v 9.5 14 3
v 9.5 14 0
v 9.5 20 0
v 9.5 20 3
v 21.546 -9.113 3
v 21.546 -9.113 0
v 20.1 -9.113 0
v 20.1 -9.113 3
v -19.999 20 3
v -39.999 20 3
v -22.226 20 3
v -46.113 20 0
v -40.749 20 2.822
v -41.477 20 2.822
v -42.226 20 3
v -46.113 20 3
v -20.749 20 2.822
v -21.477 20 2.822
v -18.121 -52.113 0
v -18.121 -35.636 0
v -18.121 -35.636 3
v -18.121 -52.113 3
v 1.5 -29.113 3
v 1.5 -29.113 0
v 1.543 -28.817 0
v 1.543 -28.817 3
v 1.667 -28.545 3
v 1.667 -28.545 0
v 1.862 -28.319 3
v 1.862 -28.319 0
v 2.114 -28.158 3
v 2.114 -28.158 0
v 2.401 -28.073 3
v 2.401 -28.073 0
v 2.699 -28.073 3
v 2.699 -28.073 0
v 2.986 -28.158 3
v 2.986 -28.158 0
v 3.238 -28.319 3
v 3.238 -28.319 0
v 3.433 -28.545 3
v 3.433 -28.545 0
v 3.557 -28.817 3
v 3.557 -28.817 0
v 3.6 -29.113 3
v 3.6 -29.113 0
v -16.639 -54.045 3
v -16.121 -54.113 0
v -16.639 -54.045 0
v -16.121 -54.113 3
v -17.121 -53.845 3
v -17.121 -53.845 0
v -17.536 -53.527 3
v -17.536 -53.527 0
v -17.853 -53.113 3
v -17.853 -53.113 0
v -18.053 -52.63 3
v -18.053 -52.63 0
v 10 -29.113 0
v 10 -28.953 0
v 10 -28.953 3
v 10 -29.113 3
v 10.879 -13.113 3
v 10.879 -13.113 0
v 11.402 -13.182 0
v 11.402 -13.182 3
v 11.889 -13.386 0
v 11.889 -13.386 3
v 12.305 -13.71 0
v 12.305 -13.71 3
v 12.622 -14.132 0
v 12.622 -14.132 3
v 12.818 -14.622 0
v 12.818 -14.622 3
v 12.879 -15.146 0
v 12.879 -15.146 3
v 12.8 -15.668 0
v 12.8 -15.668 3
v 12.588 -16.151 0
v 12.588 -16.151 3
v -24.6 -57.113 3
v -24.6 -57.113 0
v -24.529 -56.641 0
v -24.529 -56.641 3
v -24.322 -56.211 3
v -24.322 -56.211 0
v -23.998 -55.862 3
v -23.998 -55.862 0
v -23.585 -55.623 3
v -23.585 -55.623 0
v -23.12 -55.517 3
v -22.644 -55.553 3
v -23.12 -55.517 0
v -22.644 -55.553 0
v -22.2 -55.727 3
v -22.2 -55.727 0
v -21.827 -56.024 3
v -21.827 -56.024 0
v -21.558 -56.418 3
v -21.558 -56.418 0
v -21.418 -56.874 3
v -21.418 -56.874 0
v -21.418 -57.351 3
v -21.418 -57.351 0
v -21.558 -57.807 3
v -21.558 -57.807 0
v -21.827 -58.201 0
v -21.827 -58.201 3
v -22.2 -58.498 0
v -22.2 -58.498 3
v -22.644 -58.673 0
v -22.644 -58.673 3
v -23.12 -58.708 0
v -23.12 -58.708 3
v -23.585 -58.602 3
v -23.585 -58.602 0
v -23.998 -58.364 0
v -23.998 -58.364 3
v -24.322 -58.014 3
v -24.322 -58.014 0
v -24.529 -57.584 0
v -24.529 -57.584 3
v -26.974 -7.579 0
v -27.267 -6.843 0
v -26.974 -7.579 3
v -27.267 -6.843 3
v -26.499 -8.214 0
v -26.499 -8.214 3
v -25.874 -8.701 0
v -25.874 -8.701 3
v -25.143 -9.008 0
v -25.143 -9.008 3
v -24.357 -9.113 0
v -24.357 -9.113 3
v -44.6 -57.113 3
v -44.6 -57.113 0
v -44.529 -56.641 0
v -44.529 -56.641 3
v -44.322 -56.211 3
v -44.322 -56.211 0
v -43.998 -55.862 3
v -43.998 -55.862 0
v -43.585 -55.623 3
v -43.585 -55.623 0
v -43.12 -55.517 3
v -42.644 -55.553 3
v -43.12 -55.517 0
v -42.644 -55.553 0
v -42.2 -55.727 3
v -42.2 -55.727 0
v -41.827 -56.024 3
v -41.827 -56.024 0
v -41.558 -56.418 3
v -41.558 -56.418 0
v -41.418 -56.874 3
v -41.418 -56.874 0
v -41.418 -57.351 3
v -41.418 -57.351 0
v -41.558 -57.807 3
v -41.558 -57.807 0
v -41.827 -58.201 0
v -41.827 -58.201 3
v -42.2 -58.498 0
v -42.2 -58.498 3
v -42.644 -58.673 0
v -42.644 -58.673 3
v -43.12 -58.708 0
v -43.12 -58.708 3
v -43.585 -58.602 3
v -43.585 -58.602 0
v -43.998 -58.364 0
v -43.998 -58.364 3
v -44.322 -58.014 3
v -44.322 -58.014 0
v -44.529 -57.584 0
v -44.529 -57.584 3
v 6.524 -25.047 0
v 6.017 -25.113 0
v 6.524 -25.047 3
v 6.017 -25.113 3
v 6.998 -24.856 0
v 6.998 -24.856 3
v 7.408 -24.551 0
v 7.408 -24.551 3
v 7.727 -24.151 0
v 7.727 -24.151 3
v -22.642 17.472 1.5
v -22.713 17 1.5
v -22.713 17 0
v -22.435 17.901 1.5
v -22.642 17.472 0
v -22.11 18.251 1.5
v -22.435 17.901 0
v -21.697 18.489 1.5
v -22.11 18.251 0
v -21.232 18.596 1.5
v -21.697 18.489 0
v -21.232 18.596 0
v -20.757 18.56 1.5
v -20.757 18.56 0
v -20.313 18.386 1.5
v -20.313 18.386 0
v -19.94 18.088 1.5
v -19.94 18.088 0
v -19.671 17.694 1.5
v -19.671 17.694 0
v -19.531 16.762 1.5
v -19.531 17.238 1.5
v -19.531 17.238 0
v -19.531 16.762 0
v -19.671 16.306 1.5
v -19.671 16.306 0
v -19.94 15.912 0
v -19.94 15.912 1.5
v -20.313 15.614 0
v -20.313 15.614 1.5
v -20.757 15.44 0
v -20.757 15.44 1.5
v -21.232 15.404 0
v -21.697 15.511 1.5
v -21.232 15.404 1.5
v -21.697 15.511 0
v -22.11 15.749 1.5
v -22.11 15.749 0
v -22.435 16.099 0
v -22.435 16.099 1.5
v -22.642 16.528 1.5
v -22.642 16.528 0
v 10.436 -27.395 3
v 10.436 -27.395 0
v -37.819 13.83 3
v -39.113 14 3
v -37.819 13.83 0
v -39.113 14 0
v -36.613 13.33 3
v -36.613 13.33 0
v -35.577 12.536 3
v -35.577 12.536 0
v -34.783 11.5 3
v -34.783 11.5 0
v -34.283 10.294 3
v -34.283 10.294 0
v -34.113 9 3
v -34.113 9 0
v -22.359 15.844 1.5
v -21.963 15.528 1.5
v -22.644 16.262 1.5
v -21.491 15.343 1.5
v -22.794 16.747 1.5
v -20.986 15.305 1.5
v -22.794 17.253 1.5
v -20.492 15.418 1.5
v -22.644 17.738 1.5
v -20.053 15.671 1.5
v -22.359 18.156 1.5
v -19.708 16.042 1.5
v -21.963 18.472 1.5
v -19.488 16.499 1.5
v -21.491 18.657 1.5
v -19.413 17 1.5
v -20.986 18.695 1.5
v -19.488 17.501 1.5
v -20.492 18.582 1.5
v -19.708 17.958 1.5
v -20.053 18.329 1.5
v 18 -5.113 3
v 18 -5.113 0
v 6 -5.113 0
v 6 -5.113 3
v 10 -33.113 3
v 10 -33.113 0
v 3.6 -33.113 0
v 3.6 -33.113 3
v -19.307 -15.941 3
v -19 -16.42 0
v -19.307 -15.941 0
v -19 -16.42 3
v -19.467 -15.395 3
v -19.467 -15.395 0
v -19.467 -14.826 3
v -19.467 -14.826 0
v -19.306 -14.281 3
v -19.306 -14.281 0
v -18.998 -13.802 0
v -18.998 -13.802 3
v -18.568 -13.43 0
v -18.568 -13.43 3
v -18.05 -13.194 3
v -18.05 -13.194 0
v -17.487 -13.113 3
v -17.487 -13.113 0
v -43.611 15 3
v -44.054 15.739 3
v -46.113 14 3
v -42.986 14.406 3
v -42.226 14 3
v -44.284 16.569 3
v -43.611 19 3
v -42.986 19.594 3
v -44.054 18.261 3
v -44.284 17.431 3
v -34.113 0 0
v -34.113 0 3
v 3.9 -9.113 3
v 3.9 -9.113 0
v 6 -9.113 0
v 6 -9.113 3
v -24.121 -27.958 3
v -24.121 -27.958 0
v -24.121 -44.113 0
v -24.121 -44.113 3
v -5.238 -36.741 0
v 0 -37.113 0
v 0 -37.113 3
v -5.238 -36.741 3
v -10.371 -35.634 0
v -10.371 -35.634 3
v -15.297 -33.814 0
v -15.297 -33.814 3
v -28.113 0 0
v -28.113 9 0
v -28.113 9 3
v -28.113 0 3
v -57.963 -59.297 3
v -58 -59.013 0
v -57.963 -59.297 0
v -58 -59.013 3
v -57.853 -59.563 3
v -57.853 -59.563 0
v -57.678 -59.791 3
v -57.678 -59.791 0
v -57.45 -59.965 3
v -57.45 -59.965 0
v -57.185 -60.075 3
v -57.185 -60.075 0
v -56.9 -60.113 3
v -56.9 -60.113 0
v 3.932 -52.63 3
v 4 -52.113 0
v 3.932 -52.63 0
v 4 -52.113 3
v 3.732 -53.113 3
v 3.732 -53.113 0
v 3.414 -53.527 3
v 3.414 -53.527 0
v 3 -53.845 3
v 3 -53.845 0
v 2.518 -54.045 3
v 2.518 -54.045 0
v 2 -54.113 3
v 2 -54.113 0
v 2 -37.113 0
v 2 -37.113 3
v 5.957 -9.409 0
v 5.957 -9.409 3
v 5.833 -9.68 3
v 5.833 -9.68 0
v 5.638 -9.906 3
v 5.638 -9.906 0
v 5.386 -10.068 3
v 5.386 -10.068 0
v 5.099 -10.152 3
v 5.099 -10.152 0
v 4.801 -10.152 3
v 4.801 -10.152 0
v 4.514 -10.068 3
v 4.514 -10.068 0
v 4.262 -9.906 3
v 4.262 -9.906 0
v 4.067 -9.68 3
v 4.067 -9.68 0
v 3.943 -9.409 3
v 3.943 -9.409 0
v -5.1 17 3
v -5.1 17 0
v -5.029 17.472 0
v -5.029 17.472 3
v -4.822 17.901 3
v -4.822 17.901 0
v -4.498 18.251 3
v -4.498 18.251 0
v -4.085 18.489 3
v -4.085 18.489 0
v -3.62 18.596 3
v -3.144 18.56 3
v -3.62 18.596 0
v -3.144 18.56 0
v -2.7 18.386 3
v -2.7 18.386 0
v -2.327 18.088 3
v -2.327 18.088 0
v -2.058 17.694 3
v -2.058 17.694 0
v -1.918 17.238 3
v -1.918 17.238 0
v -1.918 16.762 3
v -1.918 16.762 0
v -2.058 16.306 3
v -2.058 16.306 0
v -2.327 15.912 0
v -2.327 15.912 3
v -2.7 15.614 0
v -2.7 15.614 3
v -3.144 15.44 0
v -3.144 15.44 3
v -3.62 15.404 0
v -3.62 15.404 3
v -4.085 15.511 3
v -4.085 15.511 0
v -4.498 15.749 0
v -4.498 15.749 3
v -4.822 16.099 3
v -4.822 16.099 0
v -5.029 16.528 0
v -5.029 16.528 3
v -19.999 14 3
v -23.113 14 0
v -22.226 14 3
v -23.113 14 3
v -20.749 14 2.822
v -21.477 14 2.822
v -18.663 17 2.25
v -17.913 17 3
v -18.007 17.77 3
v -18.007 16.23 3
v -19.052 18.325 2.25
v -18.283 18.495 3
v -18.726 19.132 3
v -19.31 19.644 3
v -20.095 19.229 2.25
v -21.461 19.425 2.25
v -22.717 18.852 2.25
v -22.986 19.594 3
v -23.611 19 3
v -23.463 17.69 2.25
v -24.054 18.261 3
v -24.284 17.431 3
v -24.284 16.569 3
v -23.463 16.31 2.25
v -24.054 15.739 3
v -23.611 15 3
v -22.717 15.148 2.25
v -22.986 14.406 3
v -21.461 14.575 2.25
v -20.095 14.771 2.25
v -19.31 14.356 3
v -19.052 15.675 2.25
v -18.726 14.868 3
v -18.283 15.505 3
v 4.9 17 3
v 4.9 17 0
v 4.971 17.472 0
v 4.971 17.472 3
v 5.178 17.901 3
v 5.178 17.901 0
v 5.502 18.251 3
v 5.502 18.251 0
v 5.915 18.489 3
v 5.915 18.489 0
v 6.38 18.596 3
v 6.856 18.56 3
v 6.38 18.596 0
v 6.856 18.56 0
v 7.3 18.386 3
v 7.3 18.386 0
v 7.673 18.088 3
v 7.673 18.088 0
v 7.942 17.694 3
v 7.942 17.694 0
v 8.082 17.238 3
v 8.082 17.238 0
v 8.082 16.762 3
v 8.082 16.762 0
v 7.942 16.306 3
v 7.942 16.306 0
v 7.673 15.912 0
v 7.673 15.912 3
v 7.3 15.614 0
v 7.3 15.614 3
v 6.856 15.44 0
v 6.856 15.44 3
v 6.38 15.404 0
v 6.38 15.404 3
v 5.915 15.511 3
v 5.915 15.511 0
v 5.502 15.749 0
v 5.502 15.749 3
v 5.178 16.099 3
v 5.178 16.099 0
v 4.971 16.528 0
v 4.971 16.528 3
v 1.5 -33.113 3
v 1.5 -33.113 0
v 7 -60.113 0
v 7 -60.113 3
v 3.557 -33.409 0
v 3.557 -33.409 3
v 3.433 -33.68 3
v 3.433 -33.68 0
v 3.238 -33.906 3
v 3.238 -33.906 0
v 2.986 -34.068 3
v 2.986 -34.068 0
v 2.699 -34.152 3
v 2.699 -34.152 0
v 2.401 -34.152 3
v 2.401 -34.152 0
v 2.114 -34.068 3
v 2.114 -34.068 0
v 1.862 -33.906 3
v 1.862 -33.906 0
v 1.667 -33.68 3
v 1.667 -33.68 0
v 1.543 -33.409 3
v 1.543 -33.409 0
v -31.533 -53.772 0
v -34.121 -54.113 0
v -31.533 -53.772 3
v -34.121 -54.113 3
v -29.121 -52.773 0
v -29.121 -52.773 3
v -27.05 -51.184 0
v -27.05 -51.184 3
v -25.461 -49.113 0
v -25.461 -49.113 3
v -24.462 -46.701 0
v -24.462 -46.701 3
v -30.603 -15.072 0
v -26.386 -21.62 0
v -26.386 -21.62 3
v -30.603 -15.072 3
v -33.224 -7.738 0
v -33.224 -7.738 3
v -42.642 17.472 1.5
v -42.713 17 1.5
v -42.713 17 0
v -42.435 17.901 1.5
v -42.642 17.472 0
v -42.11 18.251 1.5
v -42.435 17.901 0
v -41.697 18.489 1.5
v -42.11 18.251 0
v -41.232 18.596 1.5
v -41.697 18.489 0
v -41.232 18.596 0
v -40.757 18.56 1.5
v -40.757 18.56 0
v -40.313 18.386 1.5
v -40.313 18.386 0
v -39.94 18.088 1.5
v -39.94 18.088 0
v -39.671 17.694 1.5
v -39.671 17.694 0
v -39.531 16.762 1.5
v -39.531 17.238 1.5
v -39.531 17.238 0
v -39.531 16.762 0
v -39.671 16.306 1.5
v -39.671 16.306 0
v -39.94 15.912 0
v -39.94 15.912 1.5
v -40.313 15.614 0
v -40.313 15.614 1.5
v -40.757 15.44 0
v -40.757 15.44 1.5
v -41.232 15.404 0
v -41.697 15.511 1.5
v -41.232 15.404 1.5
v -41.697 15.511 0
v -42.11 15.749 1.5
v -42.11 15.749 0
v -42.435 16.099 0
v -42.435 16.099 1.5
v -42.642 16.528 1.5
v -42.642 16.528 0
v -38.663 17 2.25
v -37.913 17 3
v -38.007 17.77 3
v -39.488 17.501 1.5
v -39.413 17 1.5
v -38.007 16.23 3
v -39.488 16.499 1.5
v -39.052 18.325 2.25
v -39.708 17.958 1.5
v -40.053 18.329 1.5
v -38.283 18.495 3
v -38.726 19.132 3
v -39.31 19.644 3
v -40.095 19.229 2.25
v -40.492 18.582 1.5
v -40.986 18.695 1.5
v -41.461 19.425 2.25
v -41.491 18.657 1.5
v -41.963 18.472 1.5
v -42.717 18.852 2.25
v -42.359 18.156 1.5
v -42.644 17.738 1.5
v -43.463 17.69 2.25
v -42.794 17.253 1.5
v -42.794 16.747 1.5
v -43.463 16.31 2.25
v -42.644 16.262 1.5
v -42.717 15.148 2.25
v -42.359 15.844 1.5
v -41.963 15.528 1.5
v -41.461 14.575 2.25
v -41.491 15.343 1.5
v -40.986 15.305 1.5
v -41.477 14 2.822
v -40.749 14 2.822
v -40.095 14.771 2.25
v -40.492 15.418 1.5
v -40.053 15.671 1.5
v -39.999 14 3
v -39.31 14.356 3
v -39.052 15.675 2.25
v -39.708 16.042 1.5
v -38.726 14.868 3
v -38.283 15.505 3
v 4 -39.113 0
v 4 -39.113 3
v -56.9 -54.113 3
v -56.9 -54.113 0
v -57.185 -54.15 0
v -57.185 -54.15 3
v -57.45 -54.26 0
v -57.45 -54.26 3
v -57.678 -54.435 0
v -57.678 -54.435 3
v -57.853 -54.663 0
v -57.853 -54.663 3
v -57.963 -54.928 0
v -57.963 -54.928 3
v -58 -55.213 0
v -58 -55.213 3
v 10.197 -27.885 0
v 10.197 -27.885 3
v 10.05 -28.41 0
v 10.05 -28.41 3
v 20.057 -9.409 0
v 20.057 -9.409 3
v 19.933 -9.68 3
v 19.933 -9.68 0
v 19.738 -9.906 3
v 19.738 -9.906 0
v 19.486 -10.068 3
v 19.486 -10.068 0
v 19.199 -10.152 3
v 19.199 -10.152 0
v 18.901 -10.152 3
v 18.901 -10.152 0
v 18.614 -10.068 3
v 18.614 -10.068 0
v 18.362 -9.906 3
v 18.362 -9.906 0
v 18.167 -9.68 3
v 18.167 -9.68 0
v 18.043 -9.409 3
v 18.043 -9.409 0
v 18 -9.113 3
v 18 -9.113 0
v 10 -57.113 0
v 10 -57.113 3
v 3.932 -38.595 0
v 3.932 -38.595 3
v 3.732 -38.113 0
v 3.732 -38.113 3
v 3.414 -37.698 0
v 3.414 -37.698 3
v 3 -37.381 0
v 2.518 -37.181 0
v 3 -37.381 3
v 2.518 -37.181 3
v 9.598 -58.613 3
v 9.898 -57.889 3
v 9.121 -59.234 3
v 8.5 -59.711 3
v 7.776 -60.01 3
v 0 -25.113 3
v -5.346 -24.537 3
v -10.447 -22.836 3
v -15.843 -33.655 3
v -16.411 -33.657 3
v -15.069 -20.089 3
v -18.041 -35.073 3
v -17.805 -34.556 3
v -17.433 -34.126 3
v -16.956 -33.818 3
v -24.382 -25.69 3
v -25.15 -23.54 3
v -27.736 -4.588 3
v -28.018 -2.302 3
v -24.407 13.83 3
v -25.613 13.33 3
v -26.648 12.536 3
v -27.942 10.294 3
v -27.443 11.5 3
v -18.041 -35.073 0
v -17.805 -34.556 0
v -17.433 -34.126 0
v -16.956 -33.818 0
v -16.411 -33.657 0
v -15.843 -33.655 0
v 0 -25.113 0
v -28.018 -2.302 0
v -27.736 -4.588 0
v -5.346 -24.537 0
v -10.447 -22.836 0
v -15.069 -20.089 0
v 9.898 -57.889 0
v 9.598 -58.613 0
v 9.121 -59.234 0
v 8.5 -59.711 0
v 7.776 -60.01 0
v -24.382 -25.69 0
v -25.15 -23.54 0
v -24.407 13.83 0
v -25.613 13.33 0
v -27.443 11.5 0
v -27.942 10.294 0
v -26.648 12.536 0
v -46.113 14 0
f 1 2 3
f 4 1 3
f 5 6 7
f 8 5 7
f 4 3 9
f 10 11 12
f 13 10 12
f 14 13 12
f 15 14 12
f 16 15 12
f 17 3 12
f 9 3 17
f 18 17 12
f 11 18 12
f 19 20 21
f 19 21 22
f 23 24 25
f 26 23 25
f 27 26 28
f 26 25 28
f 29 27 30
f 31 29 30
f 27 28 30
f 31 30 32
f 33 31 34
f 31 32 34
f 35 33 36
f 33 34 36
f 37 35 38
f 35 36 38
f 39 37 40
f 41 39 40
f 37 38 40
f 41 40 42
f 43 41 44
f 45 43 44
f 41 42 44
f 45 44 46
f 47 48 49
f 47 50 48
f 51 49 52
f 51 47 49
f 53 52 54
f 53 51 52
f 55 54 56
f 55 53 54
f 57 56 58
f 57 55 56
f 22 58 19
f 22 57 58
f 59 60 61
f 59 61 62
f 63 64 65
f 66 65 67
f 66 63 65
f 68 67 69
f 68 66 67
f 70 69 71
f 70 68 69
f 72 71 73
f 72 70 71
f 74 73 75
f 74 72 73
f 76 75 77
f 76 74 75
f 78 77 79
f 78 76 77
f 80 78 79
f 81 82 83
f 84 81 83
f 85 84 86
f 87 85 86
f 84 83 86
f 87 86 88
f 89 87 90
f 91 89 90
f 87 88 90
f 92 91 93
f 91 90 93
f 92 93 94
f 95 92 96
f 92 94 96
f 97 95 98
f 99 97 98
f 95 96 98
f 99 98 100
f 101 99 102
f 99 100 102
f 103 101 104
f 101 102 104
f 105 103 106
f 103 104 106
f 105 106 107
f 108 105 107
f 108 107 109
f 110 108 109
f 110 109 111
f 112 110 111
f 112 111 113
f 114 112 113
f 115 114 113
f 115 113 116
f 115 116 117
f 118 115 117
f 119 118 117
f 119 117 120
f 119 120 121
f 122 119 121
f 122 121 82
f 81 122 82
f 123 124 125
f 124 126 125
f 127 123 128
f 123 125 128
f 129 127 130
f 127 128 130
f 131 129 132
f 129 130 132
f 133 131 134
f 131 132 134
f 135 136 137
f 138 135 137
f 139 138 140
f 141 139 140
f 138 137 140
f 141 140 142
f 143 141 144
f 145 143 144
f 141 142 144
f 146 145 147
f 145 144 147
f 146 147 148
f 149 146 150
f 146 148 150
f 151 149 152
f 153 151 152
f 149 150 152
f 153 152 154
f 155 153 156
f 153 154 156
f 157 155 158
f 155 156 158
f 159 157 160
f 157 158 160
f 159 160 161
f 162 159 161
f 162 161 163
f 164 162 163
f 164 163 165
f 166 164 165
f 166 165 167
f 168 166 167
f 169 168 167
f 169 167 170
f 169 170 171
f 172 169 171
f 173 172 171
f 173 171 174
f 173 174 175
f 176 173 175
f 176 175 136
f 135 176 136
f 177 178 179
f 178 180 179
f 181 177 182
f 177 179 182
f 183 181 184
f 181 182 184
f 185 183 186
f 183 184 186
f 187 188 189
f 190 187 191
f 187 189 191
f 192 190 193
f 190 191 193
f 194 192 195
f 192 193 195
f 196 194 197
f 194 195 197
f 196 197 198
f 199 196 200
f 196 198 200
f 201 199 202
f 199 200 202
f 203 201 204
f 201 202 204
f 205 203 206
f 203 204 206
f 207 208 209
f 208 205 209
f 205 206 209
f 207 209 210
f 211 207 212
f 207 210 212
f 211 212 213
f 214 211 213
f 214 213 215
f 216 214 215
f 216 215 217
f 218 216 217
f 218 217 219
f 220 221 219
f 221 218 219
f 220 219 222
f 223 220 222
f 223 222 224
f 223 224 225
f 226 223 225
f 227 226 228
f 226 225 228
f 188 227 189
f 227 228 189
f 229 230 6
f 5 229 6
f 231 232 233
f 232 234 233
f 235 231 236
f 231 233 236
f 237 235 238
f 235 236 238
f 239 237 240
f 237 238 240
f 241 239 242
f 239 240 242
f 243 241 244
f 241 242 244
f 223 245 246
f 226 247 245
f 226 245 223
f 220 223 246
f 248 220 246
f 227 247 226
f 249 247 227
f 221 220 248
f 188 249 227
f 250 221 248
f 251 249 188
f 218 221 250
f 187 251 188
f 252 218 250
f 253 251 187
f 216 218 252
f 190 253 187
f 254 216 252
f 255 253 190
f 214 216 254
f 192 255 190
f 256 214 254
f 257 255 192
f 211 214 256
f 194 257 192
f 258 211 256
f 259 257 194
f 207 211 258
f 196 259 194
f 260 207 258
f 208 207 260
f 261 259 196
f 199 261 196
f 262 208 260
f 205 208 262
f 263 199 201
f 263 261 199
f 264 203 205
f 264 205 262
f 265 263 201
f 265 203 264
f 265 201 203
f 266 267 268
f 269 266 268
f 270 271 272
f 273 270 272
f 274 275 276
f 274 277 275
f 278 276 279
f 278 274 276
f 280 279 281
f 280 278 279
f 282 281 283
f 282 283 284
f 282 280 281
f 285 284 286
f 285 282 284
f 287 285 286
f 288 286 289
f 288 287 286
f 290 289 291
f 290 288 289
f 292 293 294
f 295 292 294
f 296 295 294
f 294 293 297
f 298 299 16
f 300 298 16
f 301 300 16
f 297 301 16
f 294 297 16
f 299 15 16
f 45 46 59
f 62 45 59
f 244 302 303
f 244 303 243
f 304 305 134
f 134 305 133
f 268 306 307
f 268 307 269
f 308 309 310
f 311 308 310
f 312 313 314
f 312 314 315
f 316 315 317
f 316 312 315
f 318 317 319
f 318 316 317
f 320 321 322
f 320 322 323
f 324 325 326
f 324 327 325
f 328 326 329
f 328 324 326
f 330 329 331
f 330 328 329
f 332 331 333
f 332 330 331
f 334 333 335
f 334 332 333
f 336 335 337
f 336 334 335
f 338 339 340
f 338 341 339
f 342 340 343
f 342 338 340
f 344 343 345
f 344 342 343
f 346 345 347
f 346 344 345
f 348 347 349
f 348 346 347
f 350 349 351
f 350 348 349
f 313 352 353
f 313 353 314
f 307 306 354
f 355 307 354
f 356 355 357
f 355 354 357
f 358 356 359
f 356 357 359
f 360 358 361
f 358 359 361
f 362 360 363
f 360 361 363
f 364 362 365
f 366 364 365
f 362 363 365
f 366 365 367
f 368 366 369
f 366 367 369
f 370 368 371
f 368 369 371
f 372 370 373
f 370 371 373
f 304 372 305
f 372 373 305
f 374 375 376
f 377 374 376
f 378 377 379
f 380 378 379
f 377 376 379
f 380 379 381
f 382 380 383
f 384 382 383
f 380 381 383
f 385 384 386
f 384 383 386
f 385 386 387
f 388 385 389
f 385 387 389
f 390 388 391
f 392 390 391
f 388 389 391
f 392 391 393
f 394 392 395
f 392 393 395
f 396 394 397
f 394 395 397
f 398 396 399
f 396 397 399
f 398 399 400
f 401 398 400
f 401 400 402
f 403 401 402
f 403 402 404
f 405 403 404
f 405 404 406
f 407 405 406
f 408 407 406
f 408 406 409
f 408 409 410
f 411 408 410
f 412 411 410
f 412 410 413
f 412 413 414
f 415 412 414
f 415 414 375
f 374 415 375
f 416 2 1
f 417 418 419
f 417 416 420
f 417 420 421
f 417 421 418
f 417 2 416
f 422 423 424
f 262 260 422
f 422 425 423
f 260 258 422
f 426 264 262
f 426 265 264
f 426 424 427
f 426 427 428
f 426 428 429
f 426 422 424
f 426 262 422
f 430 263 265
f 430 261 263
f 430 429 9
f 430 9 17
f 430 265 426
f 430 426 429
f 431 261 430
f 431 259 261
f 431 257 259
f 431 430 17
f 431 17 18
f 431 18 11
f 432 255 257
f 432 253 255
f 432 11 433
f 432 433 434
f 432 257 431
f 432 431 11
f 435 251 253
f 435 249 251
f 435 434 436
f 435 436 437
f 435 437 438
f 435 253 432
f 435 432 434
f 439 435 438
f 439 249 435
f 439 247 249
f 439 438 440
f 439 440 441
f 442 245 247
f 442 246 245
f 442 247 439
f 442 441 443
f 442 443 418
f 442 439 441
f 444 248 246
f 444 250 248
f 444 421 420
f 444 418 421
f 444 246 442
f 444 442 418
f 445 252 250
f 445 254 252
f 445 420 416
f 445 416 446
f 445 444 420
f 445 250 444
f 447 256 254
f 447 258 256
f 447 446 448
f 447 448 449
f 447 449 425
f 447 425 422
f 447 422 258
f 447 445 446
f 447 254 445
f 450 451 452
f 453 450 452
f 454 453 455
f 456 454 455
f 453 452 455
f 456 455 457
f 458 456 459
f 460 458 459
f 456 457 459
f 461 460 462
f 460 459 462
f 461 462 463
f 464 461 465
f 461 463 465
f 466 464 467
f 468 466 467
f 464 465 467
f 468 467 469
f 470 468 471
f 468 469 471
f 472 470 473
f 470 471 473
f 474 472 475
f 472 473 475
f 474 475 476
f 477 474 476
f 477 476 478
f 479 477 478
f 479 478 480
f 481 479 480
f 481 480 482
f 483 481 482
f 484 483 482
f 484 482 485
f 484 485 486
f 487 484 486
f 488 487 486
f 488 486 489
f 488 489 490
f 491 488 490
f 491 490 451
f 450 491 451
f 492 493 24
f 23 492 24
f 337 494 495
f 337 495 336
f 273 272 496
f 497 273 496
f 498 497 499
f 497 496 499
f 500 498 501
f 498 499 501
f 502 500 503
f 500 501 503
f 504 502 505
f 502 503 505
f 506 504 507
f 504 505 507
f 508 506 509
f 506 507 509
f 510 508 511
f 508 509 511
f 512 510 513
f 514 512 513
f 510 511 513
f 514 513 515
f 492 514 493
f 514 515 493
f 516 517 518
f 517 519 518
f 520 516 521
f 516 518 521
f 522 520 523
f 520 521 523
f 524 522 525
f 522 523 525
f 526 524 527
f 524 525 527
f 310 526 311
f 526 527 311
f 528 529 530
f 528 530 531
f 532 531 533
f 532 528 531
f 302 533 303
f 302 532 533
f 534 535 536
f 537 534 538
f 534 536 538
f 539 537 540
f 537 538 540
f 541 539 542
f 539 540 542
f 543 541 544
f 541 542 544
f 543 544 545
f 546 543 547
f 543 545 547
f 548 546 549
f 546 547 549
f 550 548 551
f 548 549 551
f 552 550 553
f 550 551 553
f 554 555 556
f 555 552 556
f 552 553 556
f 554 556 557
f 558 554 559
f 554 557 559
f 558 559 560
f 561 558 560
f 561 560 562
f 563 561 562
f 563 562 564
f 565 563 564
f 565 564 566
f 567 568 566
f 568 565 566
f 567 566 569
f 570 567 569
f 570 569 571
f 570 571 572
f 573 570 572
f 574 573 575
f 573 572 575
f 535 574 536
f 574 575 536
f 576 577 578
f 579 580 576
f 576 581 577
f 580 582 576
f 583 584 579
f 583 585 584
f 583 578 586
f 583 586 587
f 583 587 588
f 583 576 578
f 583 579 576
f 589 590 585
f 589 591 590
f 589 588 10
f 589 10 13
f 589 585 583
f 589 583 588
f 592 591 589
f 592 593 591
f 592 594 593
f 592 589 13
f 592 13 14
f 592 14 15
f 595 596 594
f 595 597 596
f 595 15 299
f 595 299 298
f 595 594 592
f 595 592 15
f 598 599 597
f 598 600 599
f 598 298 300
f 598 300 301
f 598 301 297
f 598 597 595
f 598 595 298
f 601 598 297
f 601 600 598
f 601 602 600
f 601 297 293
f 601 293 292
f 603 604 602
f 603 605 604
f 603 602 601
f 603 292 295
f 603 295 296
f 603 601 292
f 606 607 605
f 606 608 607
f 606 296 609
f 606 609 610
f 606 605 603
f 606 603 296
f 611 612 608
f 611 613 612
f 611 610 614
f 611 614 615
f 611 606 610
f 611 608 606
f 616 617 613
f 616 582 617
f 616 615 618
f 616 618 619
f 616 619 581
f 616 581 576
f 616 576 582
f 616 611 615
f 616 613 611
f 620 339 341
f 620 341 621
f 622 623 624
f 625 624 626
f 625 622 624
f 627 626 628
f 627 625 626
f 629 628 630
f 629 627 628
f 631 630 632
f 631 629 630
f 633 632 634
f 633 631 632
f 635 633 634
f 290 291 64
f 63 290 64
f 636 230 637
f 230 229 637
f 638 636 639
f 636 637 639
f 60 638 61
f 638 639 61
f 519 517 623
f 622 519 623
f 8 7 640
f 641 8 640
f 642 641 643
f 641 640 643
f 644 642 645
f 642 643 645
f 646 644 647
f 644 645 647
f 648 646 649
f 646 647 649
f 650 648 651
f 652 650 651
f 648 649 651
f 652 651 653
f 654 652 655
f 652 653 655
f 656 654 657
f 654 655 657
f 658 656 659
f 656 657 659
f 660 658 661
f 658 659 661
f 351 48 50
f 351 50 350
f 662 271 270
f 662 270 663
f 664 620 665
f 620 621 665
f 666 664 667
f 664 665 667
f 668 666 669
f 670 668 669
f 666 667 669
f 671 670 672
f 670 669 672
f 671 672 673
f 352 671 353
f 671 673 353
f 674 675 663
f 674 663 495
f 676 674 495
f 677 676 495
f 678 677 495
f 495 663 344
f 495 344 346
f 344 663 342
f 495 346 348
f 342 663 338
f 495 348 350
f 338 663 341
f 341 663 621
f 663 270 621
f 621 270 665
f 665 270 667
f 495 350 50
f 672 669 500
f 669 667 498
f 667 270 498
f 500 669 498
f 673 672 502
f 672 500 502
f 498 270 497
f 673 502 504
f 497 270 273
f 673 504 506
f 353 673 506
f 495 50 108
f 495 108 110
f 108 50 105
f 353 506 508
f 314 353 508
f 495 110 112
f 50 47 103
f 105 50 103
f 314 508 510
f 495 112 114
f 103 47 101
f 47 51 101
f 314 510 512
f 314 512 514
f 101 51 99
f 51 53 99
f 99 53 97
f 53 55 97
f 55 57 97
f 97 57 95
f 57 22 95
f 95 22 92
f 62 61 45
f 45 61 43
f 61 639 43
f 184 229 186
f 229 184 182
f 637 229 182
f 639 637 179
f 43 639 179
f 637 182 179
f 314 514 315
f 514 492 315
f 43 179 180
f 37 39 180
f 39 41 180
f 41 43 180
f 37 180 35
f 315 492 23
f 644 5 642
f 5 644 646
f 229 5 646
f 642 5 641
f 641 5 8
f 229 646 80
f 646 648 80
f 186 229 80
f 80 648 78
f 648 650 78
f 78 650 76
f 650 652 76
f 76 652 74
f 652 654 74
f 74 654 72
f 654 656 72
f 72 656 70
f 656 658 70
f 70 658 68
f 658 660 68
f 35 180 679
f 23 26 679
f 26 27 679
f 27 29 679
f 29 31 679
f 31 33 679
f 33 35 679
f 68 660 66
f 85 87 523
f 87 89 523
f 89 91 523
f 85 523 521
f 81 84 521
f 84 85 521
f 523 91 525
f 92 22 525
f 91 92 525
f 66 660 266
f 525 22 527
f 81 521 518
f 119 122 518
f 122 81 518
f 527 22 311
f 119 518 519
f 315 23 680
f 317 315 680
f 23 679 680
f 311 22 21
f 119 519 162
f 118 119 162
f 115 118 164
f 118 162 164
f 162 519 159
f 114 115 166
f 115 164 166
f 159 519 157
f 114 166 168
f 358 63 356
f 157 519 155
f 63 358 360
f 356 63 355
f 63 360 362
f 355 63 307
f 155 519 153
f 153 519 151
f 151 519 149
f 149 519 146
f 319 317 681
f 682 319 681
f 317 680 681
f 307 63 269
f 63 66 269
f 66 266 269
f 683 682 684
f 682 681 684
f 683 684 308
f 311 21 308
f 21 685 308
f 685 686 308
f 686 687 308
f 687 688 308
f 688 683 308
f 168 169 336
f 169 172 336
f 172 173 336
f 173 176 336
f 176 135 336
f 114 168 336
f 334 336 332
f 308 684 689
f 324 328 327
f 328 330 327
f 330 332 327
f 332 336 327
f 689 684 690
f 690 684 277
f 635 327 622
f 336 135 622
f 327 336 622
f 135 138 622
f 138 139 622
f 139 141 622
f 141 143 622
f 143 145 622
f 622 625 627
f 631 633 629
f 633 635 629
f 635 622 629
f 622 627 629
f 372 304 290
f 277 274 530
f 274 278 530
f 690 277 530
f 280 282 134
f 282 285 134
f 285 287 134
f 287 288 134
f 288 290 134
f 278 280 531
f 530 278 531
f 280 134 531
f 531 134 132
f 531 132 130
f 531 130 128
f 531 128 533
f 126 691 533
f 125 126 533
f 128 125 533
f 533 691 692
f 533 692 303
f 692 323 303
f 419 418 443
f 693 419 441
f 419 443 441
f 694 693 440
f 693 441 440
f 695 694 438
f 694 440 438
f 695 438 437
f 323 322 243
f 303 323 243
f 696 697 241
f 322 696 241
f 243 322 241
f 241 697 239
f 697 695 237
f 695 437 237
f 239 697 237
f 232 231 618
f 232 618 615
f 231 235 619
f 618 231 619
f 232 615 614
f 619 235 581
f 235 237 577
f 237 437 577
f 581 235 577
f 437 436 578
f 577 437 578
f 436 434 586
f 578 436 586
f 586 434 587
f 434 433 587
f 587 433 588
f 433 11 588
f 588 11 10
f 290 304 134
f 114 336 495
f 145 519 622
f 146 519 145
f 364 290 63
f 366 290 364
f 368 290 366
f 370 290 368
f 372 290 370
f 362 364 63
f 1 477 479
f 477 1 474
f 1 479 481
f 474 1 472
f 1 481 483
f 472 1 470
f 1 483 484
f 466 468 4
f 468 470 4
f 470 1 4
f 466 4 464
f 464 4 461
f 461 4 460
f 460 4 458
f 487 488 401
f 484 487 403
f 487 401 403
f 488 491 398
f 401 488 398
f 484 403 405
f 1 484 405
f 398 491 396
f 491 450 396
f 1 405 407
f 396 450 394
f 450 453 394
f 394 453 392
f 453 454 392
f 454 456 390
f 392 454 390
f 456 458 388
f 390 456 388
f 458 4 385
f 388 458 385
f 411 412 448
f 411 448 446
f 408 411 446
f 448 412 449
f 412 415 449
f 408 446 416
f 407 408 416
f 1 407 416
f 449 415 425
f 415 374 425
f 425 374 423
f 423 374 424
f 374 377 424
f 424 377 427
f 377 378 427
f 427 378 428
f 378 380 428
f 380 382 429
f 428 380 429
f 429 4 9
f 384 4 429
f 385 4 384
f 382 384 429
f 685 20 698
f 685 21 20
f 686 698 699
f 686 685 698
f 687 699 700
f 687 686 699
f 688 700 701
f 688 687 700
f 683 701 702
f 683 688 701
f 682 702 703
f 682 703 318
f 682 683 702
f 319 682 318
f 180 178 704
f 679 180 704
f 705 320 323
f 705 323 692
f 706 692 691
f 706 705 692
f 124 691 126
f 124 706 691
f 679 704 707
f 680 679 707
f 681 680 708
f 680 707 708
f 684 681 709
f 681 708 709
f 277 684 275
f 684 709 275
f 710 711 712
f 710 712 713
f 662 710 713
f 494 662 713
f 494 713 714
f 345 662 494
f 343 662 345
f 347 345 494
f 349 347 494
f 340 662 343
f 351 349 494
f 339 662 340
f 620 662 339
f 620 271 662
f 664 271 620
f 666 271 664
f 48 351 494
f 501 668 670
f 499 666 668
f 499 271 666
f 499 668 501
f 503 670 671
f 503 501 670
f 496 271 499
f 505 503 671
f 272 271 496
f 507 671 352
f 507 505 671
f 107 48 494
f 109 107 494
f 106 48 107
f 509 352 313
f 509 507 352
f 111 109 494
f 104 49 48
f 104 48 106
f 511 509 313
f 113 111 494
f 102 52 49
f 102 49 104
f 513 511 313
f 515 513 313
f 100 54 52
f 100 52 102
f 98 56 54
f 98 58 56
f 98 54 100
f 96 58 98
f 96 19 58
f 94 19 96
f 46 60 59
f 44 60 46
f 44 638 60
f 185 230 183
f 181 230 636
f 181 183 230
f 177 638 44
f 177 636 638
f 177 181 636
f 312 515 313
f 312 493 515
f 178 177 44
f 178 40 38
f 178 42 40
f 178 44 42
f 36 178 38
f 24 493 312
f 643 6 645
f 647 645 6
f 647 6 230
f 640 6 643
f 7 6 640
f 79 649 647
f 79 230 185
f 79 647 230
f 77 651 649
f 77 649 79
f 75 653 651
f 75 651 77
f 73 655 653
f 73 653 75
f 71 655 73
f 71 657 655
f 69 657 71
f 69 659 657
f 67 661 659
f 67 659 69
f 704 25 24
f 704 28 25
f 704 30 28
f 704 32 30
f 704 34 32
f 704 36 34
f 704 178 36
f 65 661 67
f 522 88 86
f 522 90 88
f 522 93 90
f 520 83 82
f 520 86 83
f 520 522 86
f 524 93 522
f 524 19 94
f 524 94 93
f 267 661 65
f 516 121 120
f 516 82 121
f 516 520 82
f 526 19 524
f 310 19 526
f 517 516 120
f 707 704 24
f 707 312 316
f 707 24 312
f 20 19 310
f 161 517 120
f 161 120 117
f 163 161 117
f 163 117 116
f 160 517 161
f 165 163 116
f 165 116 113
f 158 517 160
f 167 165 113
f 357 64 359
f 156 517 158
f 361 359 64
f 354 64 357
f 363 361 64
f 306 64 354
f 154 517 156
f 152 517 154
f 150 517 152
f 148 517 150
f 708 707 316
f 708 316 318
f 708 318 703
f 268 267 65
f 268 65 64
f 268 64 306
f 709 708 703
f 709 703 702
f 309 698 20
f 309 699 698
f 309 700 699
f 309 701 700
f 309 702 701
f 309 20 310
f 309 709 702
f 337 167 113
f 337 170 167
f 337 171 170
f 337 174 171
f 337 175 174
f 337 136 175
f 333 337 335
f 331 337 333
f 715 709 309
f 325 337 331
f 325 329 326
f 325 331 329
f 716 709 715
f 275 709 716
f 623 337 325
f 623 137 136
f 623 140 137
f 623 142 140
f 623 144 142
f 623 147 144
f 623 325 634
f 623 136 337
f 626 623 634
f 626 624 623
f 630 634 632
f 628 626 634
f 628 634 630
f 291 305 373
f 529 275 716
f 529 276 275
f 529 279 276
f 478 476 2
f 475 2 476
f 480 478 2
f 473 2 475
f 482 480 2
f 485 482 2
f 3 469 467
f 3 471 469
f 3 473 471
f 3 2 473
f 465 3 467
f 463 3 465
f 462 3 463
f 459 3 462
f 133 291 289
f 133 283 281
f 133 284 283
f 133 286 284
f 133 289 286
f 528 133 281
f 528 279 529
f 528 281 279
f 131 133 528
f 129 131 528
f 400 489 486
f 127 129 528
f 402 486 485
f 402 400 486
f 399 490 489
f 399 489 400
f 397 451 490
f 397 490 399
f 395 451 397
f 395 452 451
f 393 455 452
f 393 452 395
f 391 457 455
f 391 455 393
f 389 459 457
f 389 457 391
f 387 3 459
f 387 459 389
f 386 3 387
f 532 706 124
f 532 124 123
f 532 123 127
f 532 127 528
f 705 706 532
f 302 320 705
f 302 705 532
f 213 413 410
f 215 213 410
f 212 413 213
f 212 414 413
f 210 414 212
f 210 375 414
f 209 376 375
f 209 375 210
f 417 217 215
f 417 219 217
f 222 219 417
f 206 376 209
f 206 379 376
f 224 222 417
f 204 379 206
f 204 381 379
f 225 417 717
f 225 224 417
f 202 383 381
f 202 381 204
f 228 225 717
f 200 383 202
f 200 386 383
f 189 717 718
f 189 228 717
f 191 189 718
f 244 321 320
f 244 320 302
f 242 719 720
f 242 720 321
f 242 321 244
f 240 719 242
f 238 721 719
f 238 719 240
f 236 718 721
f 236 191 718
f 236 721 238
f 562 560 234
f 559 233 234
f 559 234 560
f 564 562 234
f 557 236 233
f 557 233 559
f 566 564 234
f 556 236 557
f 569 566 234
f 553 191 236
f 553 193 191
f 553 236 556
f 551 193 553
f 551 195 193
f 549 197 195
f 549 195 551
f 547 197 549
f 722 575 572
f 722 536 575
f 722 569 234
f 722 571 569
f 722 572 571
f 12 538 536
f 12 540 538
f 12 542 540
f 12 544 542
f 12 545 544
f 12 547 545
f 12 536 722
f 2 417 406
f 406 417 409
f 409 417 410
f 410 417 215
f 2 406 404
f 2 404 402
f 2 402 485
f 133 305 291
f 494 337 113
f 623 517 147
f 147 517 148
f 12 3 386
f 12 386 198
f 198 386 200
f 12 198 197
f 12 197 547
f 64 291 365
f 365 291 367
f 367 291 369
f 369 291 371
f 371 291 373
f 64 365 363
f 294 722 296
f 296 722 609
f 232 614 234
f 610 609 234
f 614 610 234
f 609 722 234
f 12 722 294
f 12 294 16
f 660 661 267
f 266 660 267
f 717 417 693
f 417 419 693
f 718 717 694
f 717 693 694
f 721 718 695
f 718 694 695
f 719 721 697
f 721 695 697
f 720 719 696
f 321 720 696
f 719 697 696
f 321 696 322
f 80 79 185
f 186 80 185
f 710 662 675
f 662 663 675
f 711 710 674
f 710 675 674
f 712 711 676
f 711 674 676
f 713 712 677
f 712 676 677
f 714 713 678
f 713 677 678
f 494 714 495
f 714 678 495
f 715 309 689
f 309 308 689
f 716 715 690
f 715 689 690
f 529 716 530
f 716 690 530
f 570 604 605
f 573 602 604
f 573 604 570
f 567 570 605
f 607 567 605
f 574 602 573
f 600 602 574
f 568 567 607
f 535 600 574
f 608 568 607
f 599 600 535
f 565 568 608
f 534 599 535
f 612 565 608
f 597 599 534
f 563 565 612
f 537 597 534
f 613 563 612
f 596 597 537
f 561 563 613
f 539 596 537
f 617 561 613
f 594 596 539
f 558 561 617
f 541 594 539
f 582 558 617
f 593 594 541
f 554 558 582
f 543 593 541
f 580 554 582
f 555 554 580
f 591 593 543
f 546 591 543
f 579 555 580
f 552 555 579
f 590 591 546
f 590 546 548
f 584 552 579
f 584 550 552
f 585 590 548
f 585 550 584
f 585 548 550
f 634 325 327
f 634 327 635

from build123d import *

# Parameters (mm, degrees)
EXTRUDE_1_DEPTH       = 3
EXTRUDE_START         = -3
SKETCH_2_W            = 40
SKETCH_2_H            = 6
EXTRUDE_2_DEPTH       = 3
EXTRUDE_3_DEPTH       = 3
EXTRUDE_4_DEPTH       = 3
CUT_EXTRUDE_1_DEPTH   = 10
SKETCH_7_W            = 12
SKETCH_7_H            = 4
EXTRUDE_5_DEPTH       = 3
SKETCH_8_R            = 1.05
CUT_EXTRUDE_2_DEPTH   = 10
SKETCH_9_W            = 26
SKETCH_9_H            = 6
EXTRUDE_6_DEPTH       = 3
SKETCH_10_R           = 1.6
CUT_EXTRUDE_3_DEPTH   = 10
SKETCH_14_W           = 18
SKETCH_14_H           = 6
EXTRUDE_7_DEPTH       = 3
SKETCH_15_R           = 1.6
CUT_EXTRUDE_4_DEPTH   = 10
FILLET_2_R            = 3
FILLET_3_R            = 3
FILLET_4_R            = 3
FILLET_5_R            = 10
FILLET_6_R            = 1.1
CUT_EXTRUDE_7_DEPTH   = 10
FILLET_8_R            = 2
SKETCH_17_W           = 5.387301628
SKETCH_17_H           = 6
CUT_EXTRUDE_8_DEPTH   = 10
SKETCH_18_W           = 31
SKETCH_18_H           = 6
EXTRUDE_8_DEPTH       = 3
SKETCH_19_R           = 1.6
CUT_EXTRUDE_9_DEPTH   = 10
OTHER_1_OUTLINE_R     = 1.7
OTHER_1_OUTLINE_R_2   = 1.6
OTHER_1_DEPTH         = 1.5
OTHER_1_DRAFT         = -45
OTHER_1_2_OUTLINE_R   = 1.7
OTHER_1_2_OUTLINE_R_2 = 1.6
OTHER_1_2_DEPTH       = 1.5
OTHER_1_2_DRAFT       = -45
SKETCH_23_W           = 5
SKETCH_23_H           = 6
CUT_EXTRUDE_10_DEPTH  = 10
FILLET_9_R            = 5


# Read off the part's stored shape, not the designer's step: 高级异型孔1
with BuildPart() as part:
    # 草图1 → 凸台-拉伸1 (new body)
    with BuildSketch(Plane.XY):
        with BuildLine():
            Line((0, -28.112698372), (10, -28.112698372))
            Line((10, -28.112698372), (10, -34.112698372))
            Line((10, -34.112698372), (0, -34.112698372))
            ThreePointArc((0, -34.112698372), (-24.121320344, -24.121320344), (-34.112698372, 0))
            Line((-34.112698372, 0), (-34.112698372, 20))
            Line((-34.112698372, 20), (-28.112698372, 20))
            Line((-28.112698372, 20), (-28.112698372, 0))
            ThreePointArc((-28.112698372, 0), (-19.878679656, -19.878679656), (0, -28.112698372))
        make_face()
    extrude(amount=EXTRUDE_1_DEPTH)

    # 草图2 → 凸台-拉伸2 (add)
    with BuildSketch(Plane.XY.offset(3).offset(EXTRUDE_START)):
        with BuildLine():
            Line((-24.121320344, -24.121320344), (-24.121320344, -54.112698372))
            Line((-24.121320344, -54.112698372), (-40, -54.112698372))
            Line((-40, -54.112698372), (-40, -60.112698372))
            Line((-40, -60.112698372), (10, -60.112698372))
            Line((10, -60.112698372), (10, -54.112698372))
            Line((10, -54.112698372), (-18.121320344, -54.112698372))
            Line((-18.121320344, -54.112698372), (-18.121320344, -28.901452199))
            ThreePointArc((-18.121320344, -28.901452199), (-21.256118841, -26.680584739), (-24.121320344, -24.121320344))
        make_face()
        with Locations((-31.112698372, 17)):
            Rectangle(SKETCH_2_W, SKETCH_2_H)
    extrude(amount=EXTRUDE_2_DEPTH)

    # 草图4 → 凸台-拉伸3 (add)
    with BuildSketch(Plane(origin=(0, 0, 0), x_dir=(-1, 0, 0), z_dir=(0, 0, -1))):
        with BuildLine():
            Line((-10, -28.112698372), (-21.546473969, -9.112698372))
            Line((-21.546473969, -9.112698372), (26.59478404, -9.112698372))
            ThreePointArc((26.59478404, -9.112698372), (16.342295877, -22.874727872), (0, -28.112698372))
            Line((0, -28.112698372), (-10, -28.112698372))
        make_face()
    extrude(amount=-EXTRUDE_3_DEPTH)

    # 草图6 → 凸台-拉伸4 (add)
    with BuildSketch(Plane.XY.offset(3).offset(EXTRUDE_START)):
        with BuildLine():
            Line((10, -34.112698372), (10, -54.112698372))
            Line((10, -54.112698372), (-18.121320344, -54.112698372))
            Line((-18.121320344, -54.112698372), (-18.121320344, -28.901452199))
            ThreePointArc((-18.121320344, -28.901452199), (-9.427875393, -32.784010673), (0, -34.112698372))
            Line((0, -34.112698372), (10, -34.112698372))
        make_face()
    extrude(amount=EXTRUDE_4_DEPTH)

    # 草图3 → 切除-拉伸1 (cut)
    with BuildSketch(Plane(origin=(0, 0, 0), x_dir=(-1, 0, 0), z_dir=(0, 0, -1))):
        with BuildLine():
            Line((-3.6, -29.112698372), (-10, -29.112698372))
            Line((-10, -29.112698372), (-10, -33.112698372))
            Line((-10, -33.112698372), (-3.6, -33.112698372))
            ThreePointArc((-3.6, -33.112698372), (-2.55, -34.162698372), (-1.5, -33.112698372))
            Line((-1.5, -33.112698372), (-1.5, -29.112698372))
            ThreePointArc((-1.5, -29.112698372), (-2.55, -28.062698372), (-3.6, -29.112698372))
        make_face()
    extrude(amount=-CUT_EXTRUDE_1_DEPTH, mode=Mode.SUBTRACT)

    # 草图7 → 凸台-拉伸5 (add)
    with BuildSketch(Plane(origin=(0, 0, 0), x_dir=(-1, 0, 0), z_dir=(0, 0, -1))):
        with Locations((-12, -7.112698372)):
            Rectangle(SKETCH_7_W, SKETCH_7_H)
    extrude(amount=-EXTRUDE_5_DEPTH)

    # 草图8 → 切除-拉伸2 (cut)
    with BuildSketch(Plane(origin=(0, 0, 0), x_dir=(-1, 0, 0), z_dir=(0, 0, -1))):
        with Locations((-4.95, -9.112698372)):
            Circle(SKETCH_8_R)
        with Locations((-19.05, -9.112698372)):
            Circle(SKETCH_8_R)
    extrude(amount=-CUT_EXTRUDE_2_DEPTH, mode=Mode.SUBTRACT)

    # 草图9 → 凸台-拉伸6 (add)
    with BuildSketch(Plane(origin=(0, 0, 0), x_dir=(-1, 0, 0), z_dir=(0, 0, -1))):
        with Locations((-1.887301628, 17)):
            Rectangle(SKETCH_9_W, SKETCH_9_H)
    extrude(amount=-EXTRUDE_6_DEPTH)

    # 草图10 → 切除-拉伸3 (cut)
    with BuildSketch(Plane(origin=(0, 0, 0), x_dir=(-1, 0, 0), z_dir=(0, 0, -1))):
        with Locations((41.112698372, 17)):
            Circle(SKETCH_10_R)
        with Locations((21.112698372, 17)):
            Circle(SKETCH_10_R)
        with Locations((3.5, 17)):
            Circle(SKETCH_10_R)
        with Locations((-6.5, 17)):
            Circle(SKETCH_10_R)
    extrude(amount=-CUT_EXTRUDE_3_DEPTH, mode=Mode.SUBTRACT)

    # 草图14 → 凸台-拉伸7 (add)
    with BuildSketch(Plane(origin=(0, 0, 0), x_dir=(-1, 0, 0), z_dir=(0, 0, -1))):
        with Locations((49, -57.112698372)):
            Rectangle(SKETCH_14_W, SKETCH_14_H)
    extrude(amount=-EXTRUDE_7_DEPTH)

    # 草图15 → 切除-拉伸4 (cut)
    with BuildSketch(Plane(origin=(0, 0, 0), x_dir=(-1, 0, 0), z_dir=(0, 0, -1))):
        with Locations((43, -57.112698372)):
            Circle(SKETCH_15_R)
        with Locations((23, -57.112698372)):
            Circle(SKETCH_15_R)
    extrude(amount=-CUT_EXTRUDE_4_DEPTH, mode=Mode.SUBTRACT)

    # 圆角2
    fillet_2_edges = [part.edges().sort_by_distance(p)[0] for p in [
        (-26.59478404, -9.112698372, 1.5),
    ]]
    fillet(fillet_2_edges, radius=FILLET_2_R)

    # 圆角3
    fillet_3_edges = [part.edges().sort_by_distance(p)[0] for p in [
        (10, -28.112698372, 1.5),
    ]]
    fillet(fillet_3_edges, radius=FILLET_3_R)

    # 圆角4
    fillet_4_edges = [part.edges().sort_by_distance(p)[0] for p in [
        (10, -60.112698372, 1.5),
    ]]
    fillet(fillet_4_edges, radius=FILLET_4_R)

    # 圆角5
    fillet_5_edges = [part.edges().sort_by_distance(p)[0] for p in [
        (-24.121320344, -24.121320344, 1.5),
        (-24.121320344, -54.112698372, 1.5),
    ]]
    fillet(fillet_5_edges, radius=FILLET_5_R)

    # 圆角6
    fillet_6_edges = [part.edges().sort_by_distance(p)[0] for p in [
        (-58, -60.112698372, 1.5),
        (-58, -54.112698372, 1.5),
    ]]
    fillet(fillet_6_edges, radius=FILLET_6_R)

    # 草图16 → 切除-拉伸7 (cut)
    with BuildSketch(Plane(origin=(0, 0, 0), x_dir=(-1, 0, 0), z_dir=(0, 0, -1))):
        with BuildLine():
            Line((-4, -37.112698372), (0, -37.112698372))
            ThreePointArc((0, -37.112698372), (9.363584206, -35.912054679), (18.121320344, -32.387808346))
            Line((18.121320344, -32.387808346), (18.121320344, -54.112698372))
            Line((18.121320344, -54.112698372), (-4, -54.112698372))
            Line((-4, -54.112698372), (-4, -37.112698372))
        make_face()
        with BuildLine():
            Line((-7.142425951, -25.112698372), (0, -25.112698372))
            ThreePointArc((0, -25.112698372), (12.275023024, -21.908250256), (21.417393888, -13.112698372))
            Line((21.417393888, -13.112698372), (-14.434935826, -13.112698372))
            Line((-14.434935826, -13.112698372), (-7.142425951, -25.112698372))
        make_face()
    extrude(amount=-CUT_EXTRUDE_7_DEPTH, mode=Mode.SUBTRACT)

    # 圆角8
    fillet_8_edges = [part.edges().sort_by_distance(p)[0] for p in [
        (4, -54.112698372, 1.5),
        (4, -37.112698372, 1.5),
        (-18.121320344, -32.387808346, 1.5),
        (-18.121320344, -54.112698372, 1.5),
        (-21.417393888, -13.112698372, 1.5),
        (7.142425951, -25.112698372, 1.5),
        (14.434935826, -13.112698372, 1.5),
    ]]
    fillet(fillet_8_edges, radius=FILLET_8_R)

    # 草图17 → 切除-拉伸8 (cut)
    with BuildSketch(Plane(origin=(0, 0, 0), x_dir=(-1, 0, 0), z_dir=(0, 0, -1))):
        with Locations((-12.193650814, 17)):
            Rectangle(SKETCH_17_W, SKETCH_17_H)
    extrude(amount=-CUT_EXTRUDE_8_DEPTH, mode=Mode.SUBTRACT)

    # 草图18 → 凸台-拉伸8 (add)
    with BuildSketch(Plane(origin=(0, 0, 0), x_dir=(-1, 0, 0), z_dir=(0, 0, -1))):
        with Locations((31.612698372, 17)):
            Rectangle(SKETCH_18_W, SKETCH_18_H)
    extrude(amount=-EXTRUDE_8_DEPTH)

    # 草图19 → 切除-拉伸9 (cut)
    with BuildSketch(Plane(origin=(0, 0, 0), x_dir=(-1, 0, 0), z_dir=(0, 0, -1))):
        with Locations((21.112698372, 17)):
            Circle(SKETCH_19_R)
        with Locations((41.112698372, 17)):
            Circle(SKETCH_19_R)
    extrude(amount=-CUT_EXTRUDE_9_DEPTH, mode=Mode.SUBTRACT)


with BuildPart() as other_1_tool:
    # 高级异型孔1 outline → 高级异型孔1 (with draft: the straight prism first)
    with BuildSketch(Plane.XY.offset(1.5)):
        with Locations((-21.112698372, 17)):
            Circle(OTHER_1_OUTLINE_R)
        with Locations((-21.112698372, 17)):
            Circle(OTHER_1_OUTLINE_R_2, mode=Mode.SUBTRACT)
    extrude(amount=OTHER_1_DEPTH)
    # 高级异型孔1: the draft: its side faces are tilted about the plane it starts from
    other_1_sides = [other_1_tool.faces().sort_by_distance(p)[0] for p in [
        (-22.812698372, 17, 2.25),
        (-22.712698372, 17, 2.25),
    ]]
    draft(other_1_sides, Plane.XY.offset(1.5), OTHER_1_DRAFT)


with BuildPart() as part_1:
    add(part.part)

    # 高级异型孔1: cut by other_1_tool
    add(other_1_tool.part, mode=Mode.SUBTRACT)


with BuildPart() as other_1_2_tool:
    # Other 1 2 outline → Other 1 2 (with draft: the straight prism first)
    with BuildSketch(Plane.XY.offset(1.5)):
        with Locations((-41.112698372, 17)):
            Circle(OTHER_1_2_OUTLINE_R)
        with Locations((-41.112698372, 17)):
            Circle(OTHER_1_2_OUTLINE_R_2, mode=Mode.SUBTRACT)
    extrude(amount=OTHER_1_2_DEPTH)
    # Other 1 2: the draft: its side faces are tilted about the plane it starts from
    other_1_2_sides = [other_1_2_tool.faces().sort_by_distance(p)[0] for p in [
        (-42.812698372, 17, 2.25),
        (-42.712698372, 17, 2.25),
    ]]
    draft(other_1_2_sides, Plane.XY.offset(1.5), OTHER_1_2_DRAFT)


with BuildPart() as part_2:
    add(part_1.part)

    # Other 1 2: cut by other_1_2_tool
    add(other_1_2_tool.part, mode=Mode.SUBTRACT)

    # 草图23 → 切除-拉伸10 (cut)
    with BuildSketch(Plane(origin=(0, 0, 0), x_dir=(-1, 0, 0), z_dir=(0, 0, -1))):
        with Locations((48.612698372, 17)):
            Rectangle(SKETCH_23_W, SKETCH_23_H)
    extrude(amount=-CUT_EXTRUDE_10_DEPTH, mode=Mode.SUBTRACT)

    # 圆角9
    fillet_9_edges = [part_2.edges().sort_by_distance(p)[0] for p in [
        (-28.112698372, 14, 1.5),
        (-34.112698372, 14, 1.5),
    ]]
    fillet(fillet_9_edges, radius=FILLET_9_R)


solid = part_2.part
